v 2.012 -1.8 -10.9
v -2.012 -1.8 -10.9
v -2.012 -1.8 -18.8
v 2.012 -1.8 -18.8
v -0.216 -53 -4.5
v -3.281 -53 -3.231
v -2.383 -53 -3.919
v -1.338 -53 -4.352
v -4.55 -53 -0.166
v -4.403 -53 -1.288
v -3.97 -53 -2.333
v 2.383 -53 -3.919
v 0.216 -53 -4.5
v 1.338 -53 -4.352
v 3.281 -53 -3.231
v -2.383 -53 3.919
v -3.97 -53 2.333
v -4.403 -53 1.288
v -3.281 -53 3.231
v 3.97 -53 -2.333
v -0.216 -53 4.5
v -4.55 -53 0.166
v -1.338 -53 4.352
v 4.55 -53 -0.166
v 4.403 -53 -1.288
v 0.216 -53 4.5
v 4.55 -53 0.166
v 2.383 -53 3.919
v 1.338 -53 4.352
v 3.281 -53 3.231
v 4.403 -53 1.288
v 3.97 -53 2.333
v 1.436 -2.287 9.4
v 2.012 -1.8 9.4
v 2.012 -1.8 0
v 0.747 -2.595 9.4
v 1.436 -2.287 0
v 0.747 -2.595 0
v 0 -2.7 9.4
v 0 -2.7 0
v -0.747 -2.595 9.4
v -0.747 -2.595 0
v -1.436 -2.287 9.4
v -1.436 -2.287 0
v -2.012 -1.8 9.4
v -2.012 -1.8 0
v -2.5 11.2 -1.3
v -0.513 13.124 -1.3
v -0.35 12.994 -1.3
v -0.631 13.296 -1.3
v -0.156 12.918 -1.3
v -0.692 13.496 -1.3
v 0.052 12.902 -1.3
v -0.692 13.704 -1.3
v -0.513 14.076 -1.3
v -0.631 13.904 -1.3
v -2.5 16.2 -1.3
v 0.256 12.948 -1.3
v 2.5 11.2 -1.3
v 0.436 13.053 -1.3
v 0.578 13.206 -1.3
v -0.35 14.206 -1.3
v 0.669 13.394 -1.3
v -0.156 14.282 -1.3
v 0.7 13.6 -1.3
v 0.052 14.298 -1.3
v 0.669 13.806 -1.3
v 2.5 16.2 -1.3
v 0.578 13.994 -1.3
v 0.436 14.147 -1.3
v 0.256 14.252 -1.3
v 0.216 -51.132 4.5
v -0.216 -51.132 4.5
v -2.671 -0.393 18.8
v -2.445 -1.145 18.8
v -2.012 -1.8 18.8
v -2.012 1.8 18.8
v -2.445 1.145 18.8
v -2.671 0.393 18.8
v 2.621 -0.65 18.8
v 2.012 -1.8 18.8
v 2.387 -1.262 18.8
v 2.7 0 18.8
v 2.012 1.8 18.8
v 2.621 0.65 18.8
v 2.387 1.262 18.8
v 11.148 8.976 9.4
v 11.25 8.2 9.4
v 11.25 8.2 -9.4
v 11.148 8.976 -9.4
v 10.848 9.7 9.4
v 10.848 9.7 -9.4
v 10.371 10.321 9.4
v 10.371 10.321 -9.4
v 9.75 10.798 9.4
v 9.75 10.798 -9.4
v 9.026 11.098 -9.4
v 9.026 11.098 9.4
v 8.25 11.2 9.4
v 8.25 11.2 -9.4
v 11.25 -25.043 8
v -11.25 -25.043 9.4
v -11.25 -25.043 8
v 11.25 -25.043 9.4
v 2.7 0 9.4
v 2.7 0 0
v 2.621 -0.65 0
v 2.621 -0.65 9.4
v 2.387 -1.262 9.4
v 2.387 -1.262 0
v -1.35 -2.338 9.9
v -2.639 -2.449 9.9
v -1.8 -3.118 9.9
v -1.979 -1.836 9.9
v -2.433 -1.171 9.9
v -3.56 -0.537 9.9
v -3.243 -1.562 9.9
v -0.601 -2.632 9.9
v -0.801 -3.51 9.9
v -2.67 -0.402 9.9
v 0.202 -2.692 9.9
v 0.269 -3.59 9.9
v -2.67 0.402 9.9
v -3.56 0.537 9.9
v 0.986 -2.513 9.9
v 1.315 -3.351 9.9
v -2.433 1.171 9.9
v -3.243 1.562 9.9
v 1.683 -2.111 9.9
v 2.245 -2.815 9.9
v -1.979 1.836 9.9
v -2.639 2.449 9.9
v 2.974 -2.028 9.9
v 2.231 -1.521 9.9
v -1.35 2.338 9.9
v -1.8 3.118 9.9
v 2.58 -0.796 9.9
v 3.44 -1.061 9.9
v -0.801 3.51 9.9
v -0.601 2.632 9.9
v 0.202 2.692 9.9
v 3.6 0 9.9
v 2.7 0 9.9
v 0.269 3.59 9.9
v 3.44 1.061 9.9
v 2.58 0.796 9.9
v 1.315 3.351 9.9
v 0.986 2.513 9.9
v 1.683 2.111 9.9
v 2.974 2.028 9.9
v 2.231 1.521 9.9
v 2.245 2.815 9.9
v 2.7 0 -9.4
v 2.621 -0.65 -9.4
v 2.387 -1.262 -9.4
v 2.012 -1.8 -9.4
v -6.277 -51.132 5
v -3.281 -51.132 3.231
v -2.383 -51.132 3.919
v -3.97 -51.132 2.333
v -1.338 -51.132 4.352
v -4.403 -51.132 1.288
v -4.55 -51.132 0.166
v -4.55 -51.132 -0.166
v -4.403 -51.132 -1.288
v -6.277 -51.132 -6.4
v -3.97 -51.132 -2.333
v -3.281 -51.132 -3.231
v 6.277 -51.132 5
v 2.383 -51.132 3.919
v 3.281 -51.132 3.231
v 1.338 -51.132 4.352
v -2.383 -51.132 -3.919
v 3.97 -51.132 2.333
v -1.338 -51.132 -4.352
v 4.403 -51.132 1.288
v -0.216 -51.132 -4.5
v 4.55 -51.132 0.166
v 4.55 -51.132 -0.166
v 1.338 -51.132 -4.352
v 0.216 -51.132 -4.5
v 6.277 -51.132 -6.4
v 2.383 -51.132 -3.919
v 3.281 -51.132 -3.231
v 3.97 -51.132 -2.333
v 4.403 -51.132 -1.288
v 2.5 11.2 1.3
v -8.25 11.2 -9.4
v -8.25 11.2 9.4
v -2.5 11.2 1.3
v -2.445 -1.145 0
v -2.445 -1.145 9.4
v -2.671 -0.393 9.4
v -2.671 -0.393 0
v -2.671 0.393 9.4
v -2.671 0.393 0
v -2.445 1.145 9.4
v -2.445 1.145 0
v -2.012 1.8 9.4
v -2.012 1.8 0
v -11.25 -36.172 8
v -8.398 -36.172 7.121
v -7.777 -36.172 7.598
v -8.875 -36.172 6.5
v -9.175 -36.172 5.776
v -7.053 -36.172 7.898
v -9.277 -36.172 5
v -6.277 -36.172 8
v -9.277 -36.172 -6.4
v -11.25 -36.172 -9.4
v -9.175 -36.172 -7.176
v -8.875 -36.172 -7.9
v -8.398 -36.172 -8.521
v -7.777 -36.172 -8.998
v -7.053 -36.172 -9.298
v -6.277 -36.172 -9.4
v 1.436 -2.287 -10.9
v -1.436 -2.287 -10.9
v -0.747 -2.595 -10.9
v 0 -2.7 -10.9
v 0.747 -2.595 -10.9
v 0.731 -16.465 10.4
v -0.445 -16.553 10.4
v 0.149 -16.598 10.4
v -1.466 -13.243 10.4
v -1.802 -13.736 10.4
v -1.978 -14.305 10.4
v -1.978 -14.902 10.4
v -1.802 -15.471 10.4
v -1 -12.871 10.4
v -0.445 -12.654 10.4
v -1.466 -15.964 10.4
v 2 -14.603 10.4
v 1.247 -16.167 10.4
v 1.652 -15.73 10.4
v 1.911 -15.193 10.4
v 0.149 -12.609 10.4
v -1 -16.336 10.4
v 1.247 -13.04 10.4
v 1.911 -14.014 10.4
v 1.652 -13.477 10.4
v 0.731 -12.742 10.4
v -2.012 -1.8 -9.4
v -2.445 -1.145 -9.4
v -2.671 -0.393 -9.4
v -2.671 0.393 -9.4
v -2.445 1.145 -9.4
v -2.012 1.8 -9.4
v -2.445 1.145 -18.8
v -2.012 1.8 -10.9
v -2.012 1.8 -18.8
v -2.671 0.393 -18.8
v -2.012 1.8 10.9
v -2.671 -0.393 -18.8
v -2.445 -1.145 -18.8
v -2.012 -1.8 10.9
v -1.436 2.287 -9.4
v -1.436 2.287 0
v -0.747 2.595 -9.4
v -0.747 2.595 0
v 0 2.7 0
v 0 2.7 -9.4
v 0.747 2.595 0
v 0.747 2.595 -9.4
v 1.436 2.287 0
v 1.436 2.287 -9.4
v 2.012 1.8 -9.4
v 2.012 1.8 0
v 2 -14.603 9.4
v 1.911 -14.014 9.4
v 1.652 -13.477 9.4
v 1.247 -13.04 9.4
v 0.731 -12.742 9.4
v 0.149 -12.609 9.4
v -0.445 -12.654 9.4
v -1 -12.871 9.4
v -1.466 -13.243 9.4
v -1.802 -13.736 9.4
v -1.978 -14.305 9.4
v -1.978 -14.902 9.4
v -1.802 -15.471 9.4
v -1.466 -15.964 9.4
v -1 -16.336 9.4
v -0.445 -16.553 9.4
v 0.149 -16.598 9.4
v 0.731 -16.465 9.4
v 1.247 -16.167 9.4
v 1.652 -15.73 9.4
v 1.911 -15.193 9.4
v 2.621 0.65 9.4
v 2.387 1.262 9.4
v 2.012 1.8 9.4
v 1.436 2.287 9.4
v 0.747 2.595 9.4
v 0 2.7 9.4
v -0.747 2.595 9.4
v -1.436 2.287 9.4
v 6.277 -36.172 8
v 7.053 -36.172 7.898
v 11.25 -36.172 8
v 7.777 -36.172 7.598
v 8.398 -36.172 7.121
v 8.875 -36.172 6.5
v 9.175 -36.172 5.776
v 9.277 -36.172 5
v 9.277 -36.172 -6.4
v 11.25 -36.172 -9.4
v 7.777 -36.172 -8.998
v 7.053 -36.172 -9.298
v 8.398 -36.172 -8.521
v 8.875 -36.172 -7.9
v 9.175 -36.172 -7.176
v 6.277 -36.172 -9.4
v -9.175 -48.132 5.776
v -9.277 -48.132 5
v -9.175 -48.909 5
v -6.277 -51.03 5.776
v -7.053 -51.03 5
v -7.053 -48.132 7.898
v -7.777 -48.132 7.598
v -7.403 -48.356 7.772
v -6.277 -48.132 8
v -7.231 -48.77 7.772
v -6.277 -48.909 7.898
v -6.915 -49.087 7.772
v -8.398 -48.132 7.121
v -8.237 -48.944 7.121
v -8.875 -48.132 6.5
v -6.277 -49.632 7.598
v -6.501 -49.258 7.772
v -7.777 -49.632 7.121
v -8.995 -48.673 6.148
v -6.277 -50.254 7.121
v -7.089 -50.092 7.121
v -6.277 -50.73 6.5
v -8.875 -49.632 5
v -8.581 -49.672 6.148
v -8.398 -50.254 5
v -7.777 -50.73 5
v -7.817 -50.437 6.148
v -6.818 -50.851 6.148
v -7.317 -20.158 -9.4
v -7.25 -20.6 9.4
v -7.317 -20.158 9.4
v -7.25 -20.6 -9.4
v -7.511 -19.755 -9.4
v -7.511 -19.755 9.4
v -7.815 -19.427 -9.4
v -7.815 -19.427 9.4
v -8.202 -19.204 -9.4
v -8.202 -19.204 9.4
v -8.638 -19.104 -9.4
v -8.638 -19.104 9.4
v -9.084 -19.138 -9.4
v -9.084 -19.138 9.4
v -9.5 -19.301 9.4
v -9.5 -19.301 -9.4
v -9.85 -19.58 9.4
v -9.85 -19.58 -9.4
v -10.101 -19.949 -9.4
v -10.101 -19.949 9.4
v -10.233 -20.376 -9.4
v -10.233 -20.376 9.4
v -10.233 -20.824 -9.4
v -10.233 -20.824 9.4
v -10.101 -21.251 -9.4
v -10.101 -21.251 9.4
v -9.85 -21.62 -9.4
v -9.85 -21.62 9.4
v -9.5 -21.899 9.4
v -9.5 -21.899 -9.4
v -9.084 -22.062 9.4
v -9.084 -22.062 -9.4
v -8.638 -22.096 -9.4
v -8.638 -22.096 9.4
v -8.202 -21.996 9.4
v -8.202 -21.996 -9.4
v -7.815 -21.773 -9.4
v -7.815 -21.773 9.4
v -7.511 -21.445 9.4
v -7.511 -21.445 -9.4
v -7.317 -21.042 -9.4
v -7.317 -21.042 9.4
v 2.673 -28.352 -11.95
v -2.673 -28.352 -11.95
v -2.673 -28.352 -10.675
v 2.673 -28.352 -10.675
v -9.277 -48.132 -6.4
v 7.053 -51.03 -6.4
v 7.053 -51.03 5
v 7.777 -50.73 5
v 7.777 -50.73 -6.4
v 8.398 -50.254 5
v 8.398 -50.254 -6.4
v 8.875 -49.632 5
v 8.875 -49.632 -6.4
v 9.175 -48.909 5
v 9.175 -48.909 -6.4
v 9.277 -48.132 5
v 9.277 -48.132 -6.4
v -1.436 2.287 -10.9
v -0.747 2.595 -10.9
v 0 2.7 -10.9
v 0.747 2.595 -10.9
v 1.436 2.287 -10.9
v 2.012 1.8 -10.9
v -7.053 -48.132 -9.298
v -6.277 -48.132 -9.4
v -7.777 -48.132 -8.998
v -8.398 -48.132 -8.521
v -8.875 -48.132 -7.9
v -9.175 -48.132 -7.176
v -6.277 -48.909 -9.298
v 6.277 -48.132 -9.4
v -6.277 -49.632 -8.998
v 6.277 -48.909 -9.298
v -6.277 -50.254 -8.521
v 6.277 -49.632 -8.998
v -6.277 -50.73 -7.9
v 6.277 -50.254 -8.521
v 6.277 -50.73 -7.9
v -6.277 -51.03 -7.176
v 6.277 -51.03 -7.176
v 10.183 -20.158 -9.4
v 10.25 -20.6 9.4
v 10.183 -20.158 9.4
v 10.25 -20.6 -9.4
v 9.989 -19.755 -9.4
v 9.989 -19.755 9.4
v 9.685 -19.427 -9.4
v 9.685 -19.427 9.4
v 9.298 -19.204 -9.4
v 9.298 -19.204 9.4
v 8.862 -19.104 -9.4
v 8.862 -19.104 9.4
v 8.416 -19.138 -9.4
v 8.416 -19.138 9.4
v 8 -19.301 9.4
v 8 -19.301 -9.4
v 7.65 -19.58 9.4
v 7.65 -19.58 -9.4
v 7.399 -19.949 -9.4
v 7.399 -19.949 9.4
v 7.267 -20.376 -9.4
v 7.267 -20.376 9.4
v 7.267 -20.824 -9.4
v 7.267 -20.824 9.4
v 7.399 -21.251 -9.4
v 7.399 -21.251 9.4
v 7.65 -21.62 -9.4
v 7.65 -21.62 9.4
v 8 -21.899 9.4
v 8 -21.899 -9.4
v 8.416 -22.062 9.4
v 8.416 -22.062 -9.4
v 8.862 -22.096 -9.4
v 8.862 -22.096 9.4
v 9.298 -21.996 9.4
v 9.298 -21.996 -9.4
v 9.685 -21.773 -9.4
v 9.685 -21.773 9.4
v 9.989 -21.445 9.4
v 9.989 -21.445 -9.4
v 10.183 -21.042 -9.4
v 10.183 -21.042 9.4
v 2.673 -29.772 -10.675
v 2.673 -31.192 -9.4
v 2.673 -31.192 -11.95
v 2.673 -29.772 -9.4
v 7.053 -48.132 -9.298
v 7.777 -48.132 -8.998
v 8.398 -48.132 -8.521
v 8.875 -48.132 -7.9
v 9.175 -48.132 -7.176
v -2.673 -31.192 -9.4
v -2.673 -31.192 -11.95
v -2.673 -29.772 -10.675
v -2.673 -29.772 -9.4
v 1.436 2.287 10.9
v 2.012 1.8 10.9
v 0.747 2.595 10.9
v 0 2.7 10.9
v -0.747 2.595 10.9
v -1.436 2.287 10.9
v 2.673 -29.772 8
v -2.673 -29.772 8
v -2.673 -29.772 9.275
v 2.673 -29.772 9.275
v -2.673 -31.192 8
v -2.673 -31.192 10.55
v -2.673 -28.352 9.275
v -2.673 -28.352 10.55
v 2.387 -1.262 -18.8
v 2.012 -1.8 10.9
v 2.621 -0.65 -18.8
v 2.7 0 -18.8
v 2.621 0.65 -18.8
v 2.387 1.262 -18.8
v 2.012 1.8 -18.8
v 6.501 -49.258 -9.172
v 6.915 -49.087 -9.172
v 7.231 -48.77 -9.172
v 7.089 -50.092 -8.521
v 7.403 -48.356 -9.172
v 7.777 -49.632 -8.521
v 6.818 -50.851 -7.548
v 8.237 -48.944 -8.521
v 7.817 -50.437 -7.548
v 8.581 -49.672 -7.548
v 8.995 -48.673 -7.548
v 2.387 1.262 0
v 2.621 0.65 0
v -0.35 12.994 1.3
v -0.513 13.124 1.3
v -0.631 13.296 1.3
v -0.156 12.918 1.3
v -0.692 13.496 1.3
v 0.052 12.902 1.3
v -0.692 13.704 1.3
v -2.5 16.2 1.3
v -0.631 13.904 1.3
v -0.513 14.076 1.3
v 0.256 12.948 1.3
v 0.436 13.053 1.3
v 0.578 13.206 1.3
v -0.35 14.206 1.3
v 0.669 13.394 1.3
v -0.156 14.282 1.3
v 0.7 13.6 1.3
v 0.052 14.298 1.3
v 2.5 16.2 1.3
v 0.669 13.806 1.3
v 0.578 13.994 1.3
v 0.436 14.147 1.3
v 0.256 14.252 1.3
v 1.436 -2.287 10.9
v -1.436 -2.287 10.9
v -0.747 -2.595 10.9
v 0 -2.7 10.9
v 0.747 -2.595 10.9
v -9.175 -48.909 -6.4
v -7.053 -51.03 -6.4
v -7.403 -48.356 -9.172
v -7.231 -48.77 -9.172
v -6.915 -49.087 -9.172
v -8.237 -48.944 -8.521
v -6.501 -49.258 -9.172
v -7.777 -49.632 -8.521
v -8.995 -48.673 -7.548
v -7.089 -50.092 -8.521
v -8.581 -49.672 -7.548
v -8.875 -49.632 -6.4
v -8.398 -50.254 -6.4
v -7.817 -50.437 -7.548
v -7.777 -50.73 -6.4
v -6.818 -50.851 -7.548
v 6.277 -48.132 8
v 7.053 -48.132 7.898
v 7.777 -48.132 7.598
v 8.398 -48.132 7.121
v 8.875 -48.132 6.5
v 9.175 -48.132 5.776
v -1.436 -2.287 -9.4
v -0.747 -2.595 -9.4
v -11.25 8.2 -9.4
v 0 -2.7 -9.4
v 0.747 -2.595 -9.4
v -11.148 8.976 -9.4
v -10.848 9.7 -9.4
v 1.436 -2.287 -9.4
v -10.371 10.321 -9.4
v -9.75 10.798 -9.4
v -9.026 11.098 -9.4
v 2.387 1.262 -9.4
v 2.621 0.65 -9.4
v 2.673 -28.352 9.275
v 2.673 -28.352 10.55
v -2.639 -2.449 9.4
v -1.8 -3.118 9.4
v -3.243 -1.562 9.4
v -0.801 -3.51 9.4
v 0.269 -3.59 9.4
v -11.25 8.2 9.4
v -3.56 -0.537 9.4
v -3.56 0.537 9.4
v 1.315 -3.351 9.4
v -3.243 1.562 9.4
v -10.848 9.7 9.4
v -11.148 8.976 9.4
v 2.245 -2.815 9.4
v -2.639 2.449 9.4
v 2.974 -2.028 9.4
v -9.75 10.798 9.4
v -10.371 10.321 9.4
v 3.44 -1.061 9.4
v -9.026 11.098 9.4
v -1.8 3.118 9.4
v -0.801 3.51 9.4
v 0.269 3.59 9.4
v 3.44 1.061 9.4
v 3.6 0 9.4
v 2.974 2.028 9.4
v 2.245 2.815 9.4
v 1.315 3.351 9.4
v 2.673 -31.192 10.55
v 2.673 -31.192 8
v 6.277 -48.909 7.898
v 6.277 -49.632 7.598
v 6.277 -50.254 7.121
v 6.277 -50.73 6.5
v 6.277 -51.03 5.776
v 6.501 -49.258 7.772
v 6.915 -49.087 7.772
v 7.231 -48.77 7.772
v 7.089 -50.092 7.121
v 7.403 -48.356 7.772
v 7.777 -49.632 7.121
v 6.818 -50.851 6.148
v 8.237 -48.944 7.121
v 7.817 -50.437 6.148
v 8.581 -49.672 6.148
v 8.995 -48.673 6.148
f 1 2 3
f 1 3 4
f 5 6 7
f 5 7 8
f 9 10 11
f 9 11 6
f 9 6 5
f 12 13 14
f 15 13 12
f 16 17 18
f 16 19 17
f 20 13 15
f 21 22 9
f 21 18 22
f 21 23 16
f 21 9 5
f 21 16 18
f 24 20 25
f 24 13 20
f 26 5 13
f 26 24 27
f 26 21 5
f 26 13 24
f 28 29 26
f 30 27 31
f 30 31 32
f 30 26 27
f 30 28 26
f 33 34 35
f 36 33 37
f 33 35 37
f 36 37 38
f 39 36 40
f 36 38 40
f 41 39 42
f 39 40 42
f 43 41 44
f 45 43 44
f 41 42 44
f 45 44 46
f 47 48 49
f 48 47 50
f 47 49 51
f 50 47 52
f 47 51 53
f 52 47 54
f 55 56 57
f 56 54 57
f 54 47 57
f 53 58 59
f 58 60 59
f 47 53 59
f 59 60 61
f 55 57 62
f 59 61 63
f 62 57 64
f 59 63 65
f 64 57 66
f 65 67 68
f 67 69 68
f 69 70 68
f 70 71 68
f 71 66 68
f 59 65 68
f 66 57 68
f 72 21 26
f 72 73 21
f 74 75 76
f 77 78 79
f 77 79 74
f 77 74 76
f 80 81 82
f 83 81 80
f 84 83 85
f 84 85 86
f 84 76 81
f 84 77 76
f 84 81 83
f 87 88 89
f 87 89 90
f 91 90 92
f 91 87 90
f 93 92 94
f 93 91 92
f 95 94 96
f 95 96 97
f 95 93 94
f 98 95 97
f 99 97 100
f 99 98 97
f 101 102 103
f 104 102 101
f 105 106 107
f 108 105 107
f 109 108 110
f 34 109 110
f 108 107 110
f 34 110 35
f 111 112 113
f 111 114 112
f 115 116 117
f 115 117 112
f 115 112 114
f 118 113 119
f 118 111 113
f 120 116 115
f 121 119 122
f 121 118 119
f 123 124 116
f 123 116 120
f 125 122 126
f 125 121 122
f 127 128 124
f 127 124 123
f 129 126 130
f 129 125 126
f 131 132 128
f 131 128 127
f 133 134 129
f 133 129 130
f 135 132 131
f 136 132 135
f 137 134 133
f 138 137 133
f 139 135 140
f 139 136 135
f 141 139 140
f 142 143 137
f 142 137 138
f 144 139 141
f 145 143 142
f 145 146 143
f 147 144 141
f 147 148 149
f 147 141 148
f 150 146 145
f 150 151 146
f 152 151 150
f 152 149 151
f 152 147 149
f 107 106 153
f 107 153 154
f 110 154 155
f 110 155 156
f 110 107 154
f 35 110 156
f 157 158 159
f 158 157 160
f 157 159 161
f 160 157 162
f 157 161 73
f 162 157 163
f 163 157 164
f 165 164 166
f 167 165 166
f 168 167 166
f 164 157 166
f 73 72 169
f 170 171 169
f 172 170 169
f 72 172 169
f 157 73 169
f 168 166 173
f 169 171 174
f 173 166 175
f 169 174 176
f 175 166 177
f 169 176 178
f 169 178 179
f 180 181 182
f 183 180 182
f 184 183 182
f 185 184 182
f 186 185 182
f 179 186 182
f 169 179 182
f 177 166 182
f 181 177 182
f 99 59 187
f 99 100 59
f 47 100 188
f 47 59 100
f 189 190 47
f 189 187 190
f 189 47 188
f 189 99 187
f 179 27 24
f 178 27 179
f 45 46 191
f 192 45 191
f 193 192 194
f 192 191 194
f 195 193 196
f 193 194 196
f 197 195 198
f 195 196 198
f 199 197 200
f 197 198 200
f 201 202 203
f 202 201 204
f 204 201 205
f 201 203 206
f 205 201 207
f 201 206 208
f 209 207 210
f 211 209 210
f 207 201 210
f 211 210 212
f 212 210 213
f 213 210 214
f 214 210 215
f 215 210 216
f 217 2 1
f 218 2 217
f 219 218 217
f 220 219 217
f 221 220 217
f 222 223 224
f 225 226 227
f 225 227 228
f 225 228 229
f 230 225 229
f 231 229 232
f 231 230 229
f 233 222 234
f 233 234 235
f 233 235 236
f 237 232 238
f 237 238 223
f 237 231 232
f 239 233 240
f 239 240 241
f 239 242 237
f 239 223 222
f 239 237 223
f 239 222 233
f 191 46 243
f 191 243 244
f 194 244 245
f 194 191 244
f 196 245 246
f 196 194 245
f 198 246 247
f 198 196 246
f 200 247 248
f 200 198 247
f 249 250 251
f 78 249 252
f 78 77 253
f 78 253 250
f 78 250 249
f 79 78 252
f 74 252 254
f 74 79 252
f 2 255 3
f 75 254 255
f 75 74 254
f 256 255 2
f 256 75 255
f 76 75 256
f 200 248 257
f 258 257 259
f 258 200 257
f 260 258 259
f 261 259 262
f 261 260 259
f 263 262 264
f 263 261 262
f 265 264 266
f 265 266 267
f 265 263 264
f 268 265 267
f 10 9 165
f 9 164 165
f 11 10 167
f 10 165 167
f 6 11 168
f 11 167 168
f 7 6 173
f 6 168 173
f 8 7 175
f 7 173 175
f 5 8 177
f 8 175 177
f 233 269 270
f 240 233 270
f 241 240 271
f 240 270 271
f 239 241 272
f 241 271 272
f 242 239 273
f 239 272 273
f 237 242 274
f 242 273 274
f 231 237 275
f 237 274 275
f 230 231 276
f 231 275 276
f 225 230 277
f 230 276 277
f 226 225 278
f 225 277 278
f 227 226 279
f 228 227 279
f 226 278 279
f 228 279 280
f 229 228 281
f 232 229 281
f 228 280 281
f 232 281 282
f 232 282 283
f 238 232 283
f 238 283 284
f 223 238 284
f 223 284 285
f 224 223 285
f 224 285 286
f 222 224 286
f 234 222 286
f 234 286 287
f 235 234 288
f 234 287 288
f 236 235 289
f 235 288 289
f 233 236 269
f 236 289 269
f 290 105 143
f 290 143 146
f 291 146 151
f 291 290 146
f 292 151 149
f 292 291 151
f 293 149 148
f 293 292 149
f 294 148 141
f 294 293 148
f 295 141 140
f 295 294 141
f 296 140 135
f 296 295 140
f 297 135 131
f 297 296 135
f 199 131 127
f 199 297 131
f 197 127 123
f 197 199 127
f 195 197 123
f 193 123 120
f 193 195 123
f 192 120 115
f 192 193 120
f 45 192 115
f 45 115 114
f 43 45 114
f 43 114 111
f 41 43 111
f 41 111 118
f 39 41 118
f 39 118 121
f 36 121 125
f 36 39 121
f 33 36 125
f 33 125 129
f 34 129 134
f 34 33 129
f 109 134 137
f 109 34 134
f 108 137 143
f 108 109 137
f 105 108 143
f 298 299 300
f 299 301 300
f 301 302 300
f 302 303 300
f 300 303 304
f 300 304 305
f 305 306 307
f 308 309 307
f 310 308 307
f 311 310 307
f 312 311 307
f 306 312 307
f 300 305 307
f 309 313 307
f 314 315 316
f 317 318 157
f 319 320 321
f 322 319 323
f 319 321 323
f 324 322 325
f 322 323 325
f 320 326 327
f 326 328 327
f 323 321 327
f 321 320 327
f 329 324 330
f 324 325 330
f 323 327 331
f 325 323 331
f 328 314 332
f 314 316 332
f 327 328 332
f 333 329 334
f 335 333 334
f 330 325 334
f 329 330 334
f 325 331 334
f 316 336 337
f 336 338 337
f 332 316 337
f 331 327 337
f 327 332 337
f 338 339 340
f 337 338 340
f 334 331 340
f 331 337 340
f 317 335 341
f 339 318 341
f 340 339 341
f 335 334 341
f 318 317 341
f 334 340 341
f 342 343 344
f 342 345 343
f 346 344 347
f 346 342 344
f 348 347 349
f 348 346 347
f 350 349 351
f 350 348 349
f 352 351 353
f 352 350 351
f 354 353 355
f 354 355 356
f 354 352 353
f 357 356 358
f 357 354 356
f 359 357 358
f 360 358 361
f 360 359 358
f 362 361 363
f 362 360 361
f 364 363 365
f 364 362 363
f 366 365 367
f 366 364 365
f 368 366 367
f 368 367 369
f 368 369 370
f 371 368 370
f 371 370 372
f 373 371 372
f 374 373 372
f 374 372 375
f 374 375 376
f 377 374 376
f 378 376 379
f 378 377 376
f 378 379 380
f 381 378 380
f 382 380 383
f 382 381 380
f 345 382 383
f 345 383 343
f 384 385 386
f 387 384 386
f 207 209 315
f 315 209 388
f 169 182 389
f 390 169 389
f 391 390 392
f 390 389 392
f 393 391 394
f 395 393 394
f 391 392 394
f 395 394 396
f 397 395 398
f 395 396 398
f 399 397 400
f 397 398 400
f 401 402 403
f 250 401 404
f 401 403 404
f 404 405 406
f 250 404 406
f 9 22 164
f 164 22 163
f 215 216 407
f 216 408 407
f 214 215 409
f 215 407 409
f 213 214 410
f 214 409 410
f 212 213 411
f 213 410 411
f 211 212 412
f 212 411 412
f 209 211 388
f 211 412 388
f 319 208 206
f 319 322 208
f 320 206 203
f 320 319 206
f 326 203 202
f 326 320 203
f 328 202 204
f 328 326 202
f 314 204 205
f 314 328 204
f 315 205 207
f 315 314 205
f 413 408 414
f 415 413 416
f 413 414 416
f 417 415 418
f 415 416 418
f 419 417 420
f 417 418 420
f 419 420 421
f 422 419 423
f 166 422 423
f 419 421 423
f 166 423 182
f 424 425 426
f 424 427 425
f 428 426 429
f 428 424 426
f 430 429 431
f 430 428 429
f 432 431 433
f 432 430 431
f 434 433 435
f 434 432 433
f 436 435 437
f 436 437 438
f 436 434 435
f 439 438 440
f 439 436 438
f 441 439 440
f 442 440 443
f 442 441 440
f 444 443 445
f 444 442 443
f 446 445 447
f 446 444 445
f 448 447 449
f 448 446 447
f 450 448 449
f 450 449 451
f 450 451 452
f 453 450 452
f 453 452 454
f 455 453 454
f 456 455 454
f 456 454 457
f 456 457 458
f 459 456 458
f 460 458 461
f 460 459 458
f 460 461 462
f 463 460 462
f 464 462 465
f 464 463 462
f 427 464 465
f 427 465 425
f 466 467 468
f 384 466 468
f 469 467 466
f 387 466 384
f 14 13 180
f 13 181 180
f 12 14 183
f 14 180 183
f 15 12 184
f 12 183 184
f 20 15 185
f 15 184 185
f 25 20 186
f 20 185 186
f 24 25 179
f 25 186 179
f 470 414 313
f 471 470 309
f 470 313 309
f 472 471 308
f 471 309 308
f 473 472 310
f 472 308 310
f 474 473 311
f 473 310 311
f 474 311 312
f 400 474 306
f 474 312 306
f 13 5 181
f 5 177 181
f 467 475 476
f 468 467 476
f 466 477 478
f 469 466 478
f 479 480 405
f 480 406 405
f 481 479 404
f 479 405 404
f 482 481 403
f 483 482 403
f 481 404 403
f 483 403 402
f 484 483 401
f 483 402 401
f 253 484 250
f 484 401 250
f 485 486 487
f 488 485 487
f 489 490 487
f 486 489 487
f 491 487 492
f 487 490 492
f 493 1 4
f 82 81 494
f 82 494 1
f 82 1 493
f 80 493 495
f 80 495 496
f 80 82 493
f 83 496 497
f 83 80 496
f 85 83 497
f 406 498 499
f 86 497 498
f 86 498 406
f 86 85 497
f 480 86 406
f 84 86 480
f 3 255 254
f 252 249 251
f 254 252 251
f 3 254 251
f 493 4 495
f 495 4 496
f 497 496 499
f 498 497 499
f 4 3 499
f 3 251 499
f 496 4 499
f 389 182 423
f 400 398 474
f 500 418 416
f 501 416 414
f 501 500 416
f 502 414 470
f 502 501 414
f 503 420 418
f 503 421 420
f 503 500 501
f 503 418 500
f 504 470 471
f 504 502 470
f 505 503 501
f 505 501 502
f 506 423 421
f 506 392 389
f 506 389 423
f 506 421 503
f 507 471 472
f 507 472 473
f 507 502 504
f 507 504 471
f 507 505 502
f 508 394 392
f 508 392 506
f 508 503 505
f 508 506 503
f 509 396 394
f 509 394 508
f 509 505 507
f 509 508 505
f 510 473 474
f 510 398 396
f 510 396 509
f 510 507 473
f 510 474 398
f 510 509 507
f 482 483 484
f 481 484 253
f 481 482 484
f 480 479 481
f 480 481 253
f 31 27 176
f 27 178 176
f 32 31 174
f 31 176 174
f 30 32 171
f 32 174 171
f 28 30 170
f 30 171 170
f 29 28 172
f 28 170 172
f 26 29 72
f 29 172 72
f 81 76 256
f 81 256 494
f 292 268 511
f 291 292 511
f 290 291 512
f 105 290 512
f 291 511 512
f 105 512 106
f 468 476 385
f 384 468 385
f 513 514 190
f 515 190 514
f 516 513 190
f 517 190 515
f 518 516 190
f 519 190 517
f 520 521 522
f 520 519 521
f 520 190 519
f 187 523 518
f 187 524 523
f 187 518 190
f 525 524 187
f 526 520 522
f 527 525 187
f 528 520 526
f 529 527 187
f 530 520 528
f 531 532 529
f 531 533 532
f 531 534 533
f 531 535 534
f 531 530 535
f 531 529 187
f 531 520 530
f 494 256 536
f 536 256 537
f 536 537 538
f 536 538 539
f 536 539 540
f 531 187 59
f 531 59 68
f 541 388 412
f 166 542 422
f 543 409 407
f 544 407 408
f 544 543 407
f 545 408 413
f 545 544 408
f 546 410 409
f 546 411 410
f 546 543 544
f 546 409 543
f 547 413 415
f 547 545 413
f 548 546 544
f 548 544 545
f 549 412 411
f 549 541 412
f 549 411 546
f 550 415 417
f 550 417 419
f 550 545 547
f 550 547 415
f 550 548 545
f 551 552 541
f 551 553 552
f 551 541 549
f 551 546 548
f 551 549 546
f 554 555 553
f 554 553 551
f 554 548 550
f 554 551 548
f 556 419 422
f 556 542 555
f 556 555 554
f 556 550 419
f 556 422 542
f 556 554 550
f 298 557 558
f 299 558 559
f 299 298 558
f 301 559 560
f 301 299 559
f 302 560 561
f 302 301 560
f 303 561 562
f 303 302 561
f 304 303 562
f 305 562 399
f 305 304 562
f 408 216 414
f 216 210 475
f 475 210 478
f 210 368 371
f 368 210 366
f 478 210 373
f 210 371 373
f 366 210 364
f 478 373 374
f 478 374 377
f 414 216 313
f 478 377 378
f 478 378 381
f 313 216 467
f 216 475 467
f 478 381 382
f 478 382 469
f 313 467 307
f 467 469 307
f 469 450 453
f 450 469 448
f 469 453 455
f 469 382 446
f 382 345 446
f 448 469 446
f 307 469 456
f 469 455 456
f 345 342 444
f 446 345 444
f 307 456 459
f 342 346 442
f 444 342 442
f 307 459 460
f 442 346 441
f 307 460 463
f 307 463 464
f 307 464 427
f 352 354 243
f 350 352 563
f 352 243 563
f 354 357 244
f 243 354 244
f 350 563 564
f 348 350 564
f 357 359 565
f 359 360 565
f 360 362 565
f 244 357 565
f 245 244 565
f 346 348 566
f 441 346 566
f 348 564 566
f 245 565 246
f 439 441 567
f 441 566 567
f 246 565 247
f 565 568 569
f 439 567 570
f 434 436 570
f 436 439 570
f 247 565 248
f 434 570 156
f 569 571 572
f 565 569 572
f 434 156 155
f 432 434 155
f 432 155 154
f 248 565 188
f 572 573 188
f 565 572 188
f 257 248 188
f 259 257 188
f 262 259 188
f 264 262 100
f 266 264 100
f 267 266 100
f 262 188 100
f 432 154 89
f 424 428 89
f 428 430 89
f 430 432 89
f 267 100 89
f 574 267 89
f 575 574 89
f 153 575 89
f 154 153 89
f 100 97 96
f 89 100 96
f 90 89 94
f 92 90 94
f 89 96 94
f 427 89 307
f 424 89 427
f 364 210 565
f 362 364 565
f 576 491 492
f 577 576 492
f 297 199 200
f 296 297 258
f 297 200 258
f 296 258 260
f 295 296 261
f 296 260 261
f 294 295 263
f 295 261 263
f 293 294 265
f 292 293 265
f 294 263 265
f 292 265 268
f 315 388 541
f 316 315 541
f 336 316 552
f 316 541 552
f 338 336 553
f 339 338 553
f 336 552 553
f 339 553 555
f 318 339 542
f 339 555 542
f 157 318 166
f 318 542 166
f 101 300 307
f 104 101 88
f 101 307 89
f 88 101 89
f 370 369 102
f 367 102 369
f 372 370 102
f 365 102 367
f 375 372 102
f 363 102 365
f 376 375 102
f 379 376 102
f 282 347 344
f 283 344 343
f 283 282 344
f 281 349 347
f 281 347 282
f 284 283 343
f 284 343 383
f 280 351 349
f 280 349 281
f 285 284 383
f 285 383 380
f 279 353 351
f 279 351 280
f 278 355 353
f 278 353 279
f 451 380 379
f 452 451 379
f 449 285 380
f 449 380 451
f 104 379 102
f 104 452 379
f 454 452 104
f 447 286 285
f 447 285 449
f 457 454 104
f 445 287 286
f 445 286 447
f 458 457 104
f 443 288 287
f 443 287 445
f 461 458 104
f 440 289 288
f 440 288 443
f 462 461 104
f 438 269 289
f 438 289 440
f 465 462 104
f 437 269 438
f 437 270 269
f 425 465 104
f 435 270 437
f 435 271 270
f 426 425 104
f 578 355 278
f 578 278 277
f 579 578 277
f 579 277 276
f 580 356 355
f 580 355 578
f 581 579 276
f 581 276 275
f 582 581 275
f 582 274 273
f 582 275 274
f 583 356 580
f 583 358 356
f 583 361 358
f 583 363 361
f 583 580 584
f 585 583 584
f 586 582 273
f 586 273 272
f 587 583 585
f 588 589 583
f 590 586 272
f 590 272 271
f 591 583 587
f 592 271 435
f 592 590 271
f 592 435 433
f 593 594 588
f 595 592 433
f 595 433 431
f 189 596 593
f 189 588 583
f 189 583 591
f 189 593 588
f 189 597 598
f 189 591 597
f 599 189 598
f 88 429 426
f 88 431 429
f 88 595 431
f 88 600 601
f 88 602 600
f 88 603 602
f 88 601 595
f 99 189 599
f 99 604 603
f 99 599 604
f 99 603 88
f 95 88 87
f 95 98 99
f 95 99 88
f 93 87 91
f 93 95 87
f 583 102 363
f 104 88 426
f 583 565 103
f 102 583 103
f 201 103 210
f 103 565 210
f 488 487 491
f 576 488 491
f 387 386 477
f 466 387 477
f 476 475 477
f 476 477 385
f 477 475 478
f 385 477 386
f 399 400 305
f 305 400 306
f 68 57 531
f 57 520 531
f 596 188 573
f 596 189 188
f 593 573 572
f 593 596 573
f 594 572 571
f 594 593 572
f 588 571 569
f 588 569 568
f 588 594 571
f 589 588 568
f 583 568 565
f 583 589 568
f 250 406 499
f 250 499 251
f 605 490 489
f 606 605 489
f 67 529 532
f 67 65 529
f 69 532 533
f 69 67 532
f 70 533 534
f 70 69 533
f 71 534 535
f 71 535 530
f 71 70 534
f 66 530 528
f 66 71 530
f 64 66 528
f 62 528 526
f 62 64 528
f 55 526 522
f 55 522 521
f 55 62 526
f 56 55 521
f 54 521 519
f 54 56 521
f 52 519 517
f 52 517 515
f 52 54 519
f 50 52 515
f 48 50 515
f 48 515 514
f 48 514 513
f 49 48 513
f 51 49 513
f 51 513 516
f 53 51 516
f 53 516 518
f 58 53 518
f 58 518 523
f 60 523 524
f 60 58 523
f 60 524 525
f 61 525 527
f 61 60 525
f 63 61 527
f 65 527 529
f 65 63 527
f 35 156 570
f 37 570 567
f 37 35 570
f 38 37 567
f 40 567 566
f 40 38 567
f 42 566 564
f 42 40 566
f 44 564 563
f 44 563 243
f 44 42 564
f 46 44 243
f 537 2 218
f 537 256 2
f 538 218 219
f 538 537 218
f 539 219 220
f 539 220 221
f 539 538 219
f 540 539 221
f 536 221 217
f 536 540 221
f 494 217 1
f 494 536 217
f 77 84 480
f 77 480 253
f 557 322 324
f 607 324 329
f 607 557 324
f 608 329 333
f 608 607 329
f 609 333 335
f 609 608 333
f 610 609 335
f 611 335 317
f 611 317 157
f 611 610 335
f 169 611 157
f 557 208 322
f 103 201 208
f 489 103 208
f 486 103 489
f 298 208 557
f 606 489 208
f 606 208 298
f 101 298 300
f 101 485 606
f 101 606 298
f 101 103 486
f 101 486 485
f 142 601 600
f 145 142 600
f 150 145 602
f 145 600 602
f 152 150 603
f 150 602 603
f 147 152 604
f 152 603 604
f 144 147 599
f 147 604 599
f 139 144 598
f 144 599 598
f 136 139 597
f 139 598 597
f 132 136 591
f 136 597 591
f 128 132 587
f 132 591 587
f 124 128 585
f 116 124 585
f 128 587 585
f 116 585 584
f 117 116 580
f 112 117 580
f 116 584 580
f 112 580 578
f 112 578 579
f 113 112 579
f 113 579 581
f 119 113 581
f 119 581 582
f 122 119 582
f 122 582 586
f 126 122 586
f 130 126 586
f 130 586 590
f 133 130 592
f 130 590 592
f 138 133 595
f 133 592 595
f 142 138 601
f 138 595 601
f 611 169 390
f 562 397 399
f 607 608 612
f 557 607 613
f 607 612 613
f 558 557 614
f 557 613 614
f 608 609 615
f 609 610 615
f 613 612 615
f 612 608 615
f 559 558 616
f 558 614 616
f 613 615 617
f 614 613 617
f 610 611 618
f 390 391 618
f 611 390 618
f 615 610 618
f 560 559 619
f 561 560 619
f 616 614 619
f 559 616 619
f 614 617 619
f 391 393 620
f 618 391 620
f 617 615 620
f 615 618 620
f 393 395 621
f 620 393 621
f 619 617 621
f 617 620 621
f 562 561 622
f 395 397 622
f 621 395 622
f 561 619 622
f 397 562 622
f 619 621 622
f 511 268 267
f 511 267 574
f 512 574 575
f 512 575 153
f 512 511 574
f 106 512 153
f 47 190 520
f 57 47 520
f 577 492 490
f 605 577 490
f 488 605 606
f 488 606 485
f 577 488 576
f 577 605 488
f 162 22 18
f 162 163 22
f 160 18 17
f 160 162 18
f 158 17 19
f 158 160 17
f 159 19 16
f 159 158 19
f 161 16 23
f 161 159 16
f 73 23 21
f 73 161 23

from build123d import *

# Parameters (mm, degrees)
F0_R      = 1.5
F0_R_2    = 3.6
F1_DEPTH  = 9.4
F0_W      = 5
F0_H      = 5
F0_R_3    = 0.7
F2_DEPTH  = 1.3
F0_W_2    = 5.3451308049
F0_H_2    = 2.8401017189
F3_DEPTH  = 9.4
F4_DEPTH  = 8
F0_W_3    = 9.1007668525
F0_H_3    = 1.8676674664
F5_DEPTH  = 4.5
F6_R      = 3
F7_R      = 4.3340927557
F9_DEPTH  = 5.3451308049
F10_R     = 2
F11_DEPTH = 1
F10_R_2   = 3.6
F10_R_3   = 2.7
F12_DEPTH = 0.5
F13_DEPTH = 18.8
F14_DEPTH = 10.9


with BuildPart() as f1:
    # F0 (on Top) → F1 (new body, symmetric)
    with BuildSketch(Plane.XY):
        with BuildLine():
            Line((-11.25, 8.2), (-11.25, -25.0427096879))
            Line((-11.25, -25.0427096879), (11.25, -25.0427096879))
            Line((11.25, -25.0427096879), (11.25, 8.2))
            ThreePointArc((11.25, 8.2), (10.3713203436, 10.3213203436), (8.25, 11.2))
            Line((8.25, 11.2), (2.5, 11.2))
            Line((2.5, 11.2), (-2.5, 11.2))
            Line((-2.5, 11.2), (-8.25, 11.2))
            ThreePointArc((-8.25, 11.2), (-10.3713203436, 10.3213203436), (-11.25, 8.2))
        make_face()
        with Locations((-8.75, -20.6)):
            Circle(F0_R, mode=Mode.SUBTRACT)
        with Locations((8.75, -20.6)):
            Circle(F0_R, mode=Mode.SUBTRACT)
        Circle(F0_R_2, mode=Mode.SUBTRACT)
        Circle(F0_R_2)
        with BuildLine():
            ThreePointArc((2.0124611797, 1.8), (2.5222653692, 0.9634196424), (2.7, 0))
            ThreePointArc((2.7, 0), (2.5222653692, -0.9634196424), (2.0124611797, -1.8))
            ThreePointArc((2.0124611797, -1.8), (0, -2.7), (-2.0124611797, -1.8))
            ThreePointArc((-2.0124611797, -1.8), (-2.7, 0), (-2.0124611797, 1.8))
            ThreePointArc((-2.0124611797, 1.8), (0, 2.7), (2.0124611797, 1.8))
        make_face(mode=Mode.SUBTRACT)
    extrude(amount=F1_DEPTH, both=True)

    # F0 (on Top) → F2 (join, symmetric)
    with BuildSketch(Plane.XY):
        with Locations((0, 13.7)):
            Rectangle(F0_W, F0_H)
        with Locations((0, 13.6)):
            Circle(F0_R_3, mode=Mode.SUBTRACT)
    extrude(amount=F2_DEPTH, both=True)

    # F0 (on Top) → F3 (join)
    with BuildSketch(Plane.XY):
        Polygon((11.25, -25.0427096879), (-11.25, -25.0427096879), (-11.25, -36.1717492342), (-9.2768007889, -36.1717492342), (9.2768007889, -36.1717492342), (11.25, -36.1717492342), align=None)
        with Locations((0, -29.7719910741)):
            Rectangle(F0_W_2, F0_H_2, mode=Mode.SUBTRACT)
        with BuildLine():
            Line((9.2768007889, -36.1717492342), (-9.2768007889, -36.1717492342))
            Line((-9.2768007889, -36.1717492342), (-9.2768007889, -48.1323325336))
            ThreePointArc((-9.2768007889, -48.1323325336), (-8.3981211325, -50.2536528772), (-6.2768007889, -51.1323325336))
            Line((-6.2768007889, -51.1323325336), (-4.5503834262, -51.1323325336))
            Line((-4.5503834262, -51.1323325336), (4.5503834262, -51.1323325336))
            Line((4.5503834262, -51.1323325336), (6.2768007889, -51.1323325336))
            ThreePointArc((6.2768007889, -51.1323325336), (8.3981211325, -50.2536528772), (9.2768007889, -48.1323325336))
            Line((9.2768007889, -48.1323325336), (9.2768007889, -36.1717492342))
        make_face()
        with Locations((0, -29.7719910741)):
            Rectangle(F0_W_2, F0_H_2)
    extrude(amount=-F3_DEPTH)

    # F0 (on Top) → F4 (join)
    with BuildSketch(Plane.XY):
        Polygon((11.25, -25.0427096879), (-11.25, -25.0427096879), (-11.25, -36.1717492342), (-9.2768007889, -36.1717492342), (9.2768007889, -36.1717492342), (11.25, -36.1717492342), align=None)
        with Locations((0, -29.7719910741)):
            Rectangle(F0_W_2, F0_H_2, mode=Mode.SUBTRACT)
        with BuildLine():
            Line((9.2768007889, -36.1717492342), (-9.2768007889, -36.1717492342))
            Line((-9.2768007889, -36.1717492342), (-9.2768007889, -48.1323325336))
            ThreePointArc((-9.2768007889, -48.1323325336), (-8.3981211325, -50.2536528772), (-6.2768007889, -51.1323325336))
            Line((-6.2768007889, -51.1323325336), (-4.5503834262, -51.1323325336))
            Line((-4.5503834262, -51.1323325336), (4.5503834262, -51.1323325336))
            Line((4.5503834262, -51.1323325336), (6.2768007889, -51.1323325336))
            ThreePointArc((6.2768007889, -51.1323325336), (8.3981211325, -50.2536528772), (9.2768007889, -48.1323325336))
            Line((9.2768007889, -48.1323325336), (9.2768007889, -36.1717492342))
        make_face()
    extrude(amount=F4_DEPTH)

    # F0 (on Top) → F5 (join, symmetric)
    with BuildSketch(Plane.XY):
        with Locations((0, -52.0661662668)):
            Rectangle(F0_W_3, F0_H_3)
    extrude(amount=F5_DEPTH, both=True)

    # F6
    f6_edges = [f1.edges().sort_by_distance(p)[0] for p in [
        (0, -51.132333, -9.4),
        (0, -51.132333, 8),
        (-9.276801, -42.152041, -9.4),
        (-8.398121, -50.253653, -9.4),
        (8.398121, -50.253653, -9.4),
        (9.276801, -42.152041, -9.4),
        (-9.276801, -42.152041, 8),
        (-8.398121, -50.253653, 8),
        (8.398121, -50.253653, 8),
        (9.276801, -42.152041, 8),
    ]]
    fillet(f6_edges, radius=F6_R)

    # F7
    f7_edges = [f1.edges().sort_by_distance(p)[0] for p in [
        (4.550383, -52.066166, -4.5),
        (4.550383, -52.066166, 4.5),
        (-4.550383, -52.066166, -4.5),
        (-4.550383, -52.066166, 4.5),
    ]]
    fillet(f7_edges, radius=F7_R)

    # F8 (on face) → F9 (join, through all)
    with BuildSketch(Plane.YZ.offset(-2.6725654025)):
        Polygon((-31.1920419335, 10.55), (-31.1920419335, 8), (-29.7719910741, 8), (-29.7719910741, 9.275), (-28.3519402146, 9.275), (-28.3519402146, 10.55), align=None)
        Polygon((-29.7719910741, 8), (-31.1920419335, 8), (-31.1920419335, 0), (-28.3519402146, 0), (-28.3519402146, 8), align=None)
        Polygon((-28.3519402146, 0), (-31.1920419335, 0), (-31.1920419335, -9.4), (-31.1920419335, -11.95), (-28.3519402146, -11.95), (-28.3519402146, -10.675), (-29.7719910741, -10.675), (-29.7719910741, -9.4), (-28.3519402146, -9.4), align=None)
    extrude(amount=F9_DEPTH)

    # F10 (on face) → F11 (join)
    with BuildSketch(Plane.XY.offset(9.4)):
        with Locations((0, -14.6034881473)):
            Circle(F10_R)
    extrude(amount=F11_DEPTH)

    # F10 (on face) → F12 (join)
    with BuildSketch(Plane.XY.offset(9.4)):
        Circle(F10_R_2)
        Circle(F10_R_3, mode=Mode.SUBTRACT)
    extrude(amount=F12_DEPTH)


with BuildPart() as f13:
    # F0 (on Top) → F13 (new body, symmetric)
    with BuildSketch(Plane.XY):
        with BuildLine():
            ThreePointArc((2.0124611797, -1.8), (2.5222653692, -0.9634196424), (2.7, 0))
            ThreePointArc((2.7, 0), (2.5222653692, 0.9634196424), (2.0124611797, 1.8))
            Line((2.0124611797, 1.8), (-2.0124611797, 1.8))
            ThreePointArc((-2.0124611797, 1.8), (-2.7, 0), (-2.0124611797, -1.8))
            Line((-2.0124611797, -1.8), (2.0124611797, -1.8))
        make_face()
    extrude(amount=F13_DEPTH, both=True)

    # F0 (on Top) → F14 (join, symmetric)
    with BuildSketch(Plane.XY):
        with BuildLine():
            Line((-2.0124611797, 1.8), (2.0124611797, 1.8))
            ThreePointArc((2.0124611797, 1.8), (0, 2.7), (-2.0124611797, 1.8))
        make_face()
        with BuildLine():
            ThreePointArc((-2.0124611797, -1.8), (0, -2.7), (2.0124611797, -1.8))
            Line((2.0124611797, -1.8), (-2.0124611797, -1.8))
        make_face()
    extrude(amount=F14_DEPTH, both=True)


solid = Compound([f1.part, f13.part])
